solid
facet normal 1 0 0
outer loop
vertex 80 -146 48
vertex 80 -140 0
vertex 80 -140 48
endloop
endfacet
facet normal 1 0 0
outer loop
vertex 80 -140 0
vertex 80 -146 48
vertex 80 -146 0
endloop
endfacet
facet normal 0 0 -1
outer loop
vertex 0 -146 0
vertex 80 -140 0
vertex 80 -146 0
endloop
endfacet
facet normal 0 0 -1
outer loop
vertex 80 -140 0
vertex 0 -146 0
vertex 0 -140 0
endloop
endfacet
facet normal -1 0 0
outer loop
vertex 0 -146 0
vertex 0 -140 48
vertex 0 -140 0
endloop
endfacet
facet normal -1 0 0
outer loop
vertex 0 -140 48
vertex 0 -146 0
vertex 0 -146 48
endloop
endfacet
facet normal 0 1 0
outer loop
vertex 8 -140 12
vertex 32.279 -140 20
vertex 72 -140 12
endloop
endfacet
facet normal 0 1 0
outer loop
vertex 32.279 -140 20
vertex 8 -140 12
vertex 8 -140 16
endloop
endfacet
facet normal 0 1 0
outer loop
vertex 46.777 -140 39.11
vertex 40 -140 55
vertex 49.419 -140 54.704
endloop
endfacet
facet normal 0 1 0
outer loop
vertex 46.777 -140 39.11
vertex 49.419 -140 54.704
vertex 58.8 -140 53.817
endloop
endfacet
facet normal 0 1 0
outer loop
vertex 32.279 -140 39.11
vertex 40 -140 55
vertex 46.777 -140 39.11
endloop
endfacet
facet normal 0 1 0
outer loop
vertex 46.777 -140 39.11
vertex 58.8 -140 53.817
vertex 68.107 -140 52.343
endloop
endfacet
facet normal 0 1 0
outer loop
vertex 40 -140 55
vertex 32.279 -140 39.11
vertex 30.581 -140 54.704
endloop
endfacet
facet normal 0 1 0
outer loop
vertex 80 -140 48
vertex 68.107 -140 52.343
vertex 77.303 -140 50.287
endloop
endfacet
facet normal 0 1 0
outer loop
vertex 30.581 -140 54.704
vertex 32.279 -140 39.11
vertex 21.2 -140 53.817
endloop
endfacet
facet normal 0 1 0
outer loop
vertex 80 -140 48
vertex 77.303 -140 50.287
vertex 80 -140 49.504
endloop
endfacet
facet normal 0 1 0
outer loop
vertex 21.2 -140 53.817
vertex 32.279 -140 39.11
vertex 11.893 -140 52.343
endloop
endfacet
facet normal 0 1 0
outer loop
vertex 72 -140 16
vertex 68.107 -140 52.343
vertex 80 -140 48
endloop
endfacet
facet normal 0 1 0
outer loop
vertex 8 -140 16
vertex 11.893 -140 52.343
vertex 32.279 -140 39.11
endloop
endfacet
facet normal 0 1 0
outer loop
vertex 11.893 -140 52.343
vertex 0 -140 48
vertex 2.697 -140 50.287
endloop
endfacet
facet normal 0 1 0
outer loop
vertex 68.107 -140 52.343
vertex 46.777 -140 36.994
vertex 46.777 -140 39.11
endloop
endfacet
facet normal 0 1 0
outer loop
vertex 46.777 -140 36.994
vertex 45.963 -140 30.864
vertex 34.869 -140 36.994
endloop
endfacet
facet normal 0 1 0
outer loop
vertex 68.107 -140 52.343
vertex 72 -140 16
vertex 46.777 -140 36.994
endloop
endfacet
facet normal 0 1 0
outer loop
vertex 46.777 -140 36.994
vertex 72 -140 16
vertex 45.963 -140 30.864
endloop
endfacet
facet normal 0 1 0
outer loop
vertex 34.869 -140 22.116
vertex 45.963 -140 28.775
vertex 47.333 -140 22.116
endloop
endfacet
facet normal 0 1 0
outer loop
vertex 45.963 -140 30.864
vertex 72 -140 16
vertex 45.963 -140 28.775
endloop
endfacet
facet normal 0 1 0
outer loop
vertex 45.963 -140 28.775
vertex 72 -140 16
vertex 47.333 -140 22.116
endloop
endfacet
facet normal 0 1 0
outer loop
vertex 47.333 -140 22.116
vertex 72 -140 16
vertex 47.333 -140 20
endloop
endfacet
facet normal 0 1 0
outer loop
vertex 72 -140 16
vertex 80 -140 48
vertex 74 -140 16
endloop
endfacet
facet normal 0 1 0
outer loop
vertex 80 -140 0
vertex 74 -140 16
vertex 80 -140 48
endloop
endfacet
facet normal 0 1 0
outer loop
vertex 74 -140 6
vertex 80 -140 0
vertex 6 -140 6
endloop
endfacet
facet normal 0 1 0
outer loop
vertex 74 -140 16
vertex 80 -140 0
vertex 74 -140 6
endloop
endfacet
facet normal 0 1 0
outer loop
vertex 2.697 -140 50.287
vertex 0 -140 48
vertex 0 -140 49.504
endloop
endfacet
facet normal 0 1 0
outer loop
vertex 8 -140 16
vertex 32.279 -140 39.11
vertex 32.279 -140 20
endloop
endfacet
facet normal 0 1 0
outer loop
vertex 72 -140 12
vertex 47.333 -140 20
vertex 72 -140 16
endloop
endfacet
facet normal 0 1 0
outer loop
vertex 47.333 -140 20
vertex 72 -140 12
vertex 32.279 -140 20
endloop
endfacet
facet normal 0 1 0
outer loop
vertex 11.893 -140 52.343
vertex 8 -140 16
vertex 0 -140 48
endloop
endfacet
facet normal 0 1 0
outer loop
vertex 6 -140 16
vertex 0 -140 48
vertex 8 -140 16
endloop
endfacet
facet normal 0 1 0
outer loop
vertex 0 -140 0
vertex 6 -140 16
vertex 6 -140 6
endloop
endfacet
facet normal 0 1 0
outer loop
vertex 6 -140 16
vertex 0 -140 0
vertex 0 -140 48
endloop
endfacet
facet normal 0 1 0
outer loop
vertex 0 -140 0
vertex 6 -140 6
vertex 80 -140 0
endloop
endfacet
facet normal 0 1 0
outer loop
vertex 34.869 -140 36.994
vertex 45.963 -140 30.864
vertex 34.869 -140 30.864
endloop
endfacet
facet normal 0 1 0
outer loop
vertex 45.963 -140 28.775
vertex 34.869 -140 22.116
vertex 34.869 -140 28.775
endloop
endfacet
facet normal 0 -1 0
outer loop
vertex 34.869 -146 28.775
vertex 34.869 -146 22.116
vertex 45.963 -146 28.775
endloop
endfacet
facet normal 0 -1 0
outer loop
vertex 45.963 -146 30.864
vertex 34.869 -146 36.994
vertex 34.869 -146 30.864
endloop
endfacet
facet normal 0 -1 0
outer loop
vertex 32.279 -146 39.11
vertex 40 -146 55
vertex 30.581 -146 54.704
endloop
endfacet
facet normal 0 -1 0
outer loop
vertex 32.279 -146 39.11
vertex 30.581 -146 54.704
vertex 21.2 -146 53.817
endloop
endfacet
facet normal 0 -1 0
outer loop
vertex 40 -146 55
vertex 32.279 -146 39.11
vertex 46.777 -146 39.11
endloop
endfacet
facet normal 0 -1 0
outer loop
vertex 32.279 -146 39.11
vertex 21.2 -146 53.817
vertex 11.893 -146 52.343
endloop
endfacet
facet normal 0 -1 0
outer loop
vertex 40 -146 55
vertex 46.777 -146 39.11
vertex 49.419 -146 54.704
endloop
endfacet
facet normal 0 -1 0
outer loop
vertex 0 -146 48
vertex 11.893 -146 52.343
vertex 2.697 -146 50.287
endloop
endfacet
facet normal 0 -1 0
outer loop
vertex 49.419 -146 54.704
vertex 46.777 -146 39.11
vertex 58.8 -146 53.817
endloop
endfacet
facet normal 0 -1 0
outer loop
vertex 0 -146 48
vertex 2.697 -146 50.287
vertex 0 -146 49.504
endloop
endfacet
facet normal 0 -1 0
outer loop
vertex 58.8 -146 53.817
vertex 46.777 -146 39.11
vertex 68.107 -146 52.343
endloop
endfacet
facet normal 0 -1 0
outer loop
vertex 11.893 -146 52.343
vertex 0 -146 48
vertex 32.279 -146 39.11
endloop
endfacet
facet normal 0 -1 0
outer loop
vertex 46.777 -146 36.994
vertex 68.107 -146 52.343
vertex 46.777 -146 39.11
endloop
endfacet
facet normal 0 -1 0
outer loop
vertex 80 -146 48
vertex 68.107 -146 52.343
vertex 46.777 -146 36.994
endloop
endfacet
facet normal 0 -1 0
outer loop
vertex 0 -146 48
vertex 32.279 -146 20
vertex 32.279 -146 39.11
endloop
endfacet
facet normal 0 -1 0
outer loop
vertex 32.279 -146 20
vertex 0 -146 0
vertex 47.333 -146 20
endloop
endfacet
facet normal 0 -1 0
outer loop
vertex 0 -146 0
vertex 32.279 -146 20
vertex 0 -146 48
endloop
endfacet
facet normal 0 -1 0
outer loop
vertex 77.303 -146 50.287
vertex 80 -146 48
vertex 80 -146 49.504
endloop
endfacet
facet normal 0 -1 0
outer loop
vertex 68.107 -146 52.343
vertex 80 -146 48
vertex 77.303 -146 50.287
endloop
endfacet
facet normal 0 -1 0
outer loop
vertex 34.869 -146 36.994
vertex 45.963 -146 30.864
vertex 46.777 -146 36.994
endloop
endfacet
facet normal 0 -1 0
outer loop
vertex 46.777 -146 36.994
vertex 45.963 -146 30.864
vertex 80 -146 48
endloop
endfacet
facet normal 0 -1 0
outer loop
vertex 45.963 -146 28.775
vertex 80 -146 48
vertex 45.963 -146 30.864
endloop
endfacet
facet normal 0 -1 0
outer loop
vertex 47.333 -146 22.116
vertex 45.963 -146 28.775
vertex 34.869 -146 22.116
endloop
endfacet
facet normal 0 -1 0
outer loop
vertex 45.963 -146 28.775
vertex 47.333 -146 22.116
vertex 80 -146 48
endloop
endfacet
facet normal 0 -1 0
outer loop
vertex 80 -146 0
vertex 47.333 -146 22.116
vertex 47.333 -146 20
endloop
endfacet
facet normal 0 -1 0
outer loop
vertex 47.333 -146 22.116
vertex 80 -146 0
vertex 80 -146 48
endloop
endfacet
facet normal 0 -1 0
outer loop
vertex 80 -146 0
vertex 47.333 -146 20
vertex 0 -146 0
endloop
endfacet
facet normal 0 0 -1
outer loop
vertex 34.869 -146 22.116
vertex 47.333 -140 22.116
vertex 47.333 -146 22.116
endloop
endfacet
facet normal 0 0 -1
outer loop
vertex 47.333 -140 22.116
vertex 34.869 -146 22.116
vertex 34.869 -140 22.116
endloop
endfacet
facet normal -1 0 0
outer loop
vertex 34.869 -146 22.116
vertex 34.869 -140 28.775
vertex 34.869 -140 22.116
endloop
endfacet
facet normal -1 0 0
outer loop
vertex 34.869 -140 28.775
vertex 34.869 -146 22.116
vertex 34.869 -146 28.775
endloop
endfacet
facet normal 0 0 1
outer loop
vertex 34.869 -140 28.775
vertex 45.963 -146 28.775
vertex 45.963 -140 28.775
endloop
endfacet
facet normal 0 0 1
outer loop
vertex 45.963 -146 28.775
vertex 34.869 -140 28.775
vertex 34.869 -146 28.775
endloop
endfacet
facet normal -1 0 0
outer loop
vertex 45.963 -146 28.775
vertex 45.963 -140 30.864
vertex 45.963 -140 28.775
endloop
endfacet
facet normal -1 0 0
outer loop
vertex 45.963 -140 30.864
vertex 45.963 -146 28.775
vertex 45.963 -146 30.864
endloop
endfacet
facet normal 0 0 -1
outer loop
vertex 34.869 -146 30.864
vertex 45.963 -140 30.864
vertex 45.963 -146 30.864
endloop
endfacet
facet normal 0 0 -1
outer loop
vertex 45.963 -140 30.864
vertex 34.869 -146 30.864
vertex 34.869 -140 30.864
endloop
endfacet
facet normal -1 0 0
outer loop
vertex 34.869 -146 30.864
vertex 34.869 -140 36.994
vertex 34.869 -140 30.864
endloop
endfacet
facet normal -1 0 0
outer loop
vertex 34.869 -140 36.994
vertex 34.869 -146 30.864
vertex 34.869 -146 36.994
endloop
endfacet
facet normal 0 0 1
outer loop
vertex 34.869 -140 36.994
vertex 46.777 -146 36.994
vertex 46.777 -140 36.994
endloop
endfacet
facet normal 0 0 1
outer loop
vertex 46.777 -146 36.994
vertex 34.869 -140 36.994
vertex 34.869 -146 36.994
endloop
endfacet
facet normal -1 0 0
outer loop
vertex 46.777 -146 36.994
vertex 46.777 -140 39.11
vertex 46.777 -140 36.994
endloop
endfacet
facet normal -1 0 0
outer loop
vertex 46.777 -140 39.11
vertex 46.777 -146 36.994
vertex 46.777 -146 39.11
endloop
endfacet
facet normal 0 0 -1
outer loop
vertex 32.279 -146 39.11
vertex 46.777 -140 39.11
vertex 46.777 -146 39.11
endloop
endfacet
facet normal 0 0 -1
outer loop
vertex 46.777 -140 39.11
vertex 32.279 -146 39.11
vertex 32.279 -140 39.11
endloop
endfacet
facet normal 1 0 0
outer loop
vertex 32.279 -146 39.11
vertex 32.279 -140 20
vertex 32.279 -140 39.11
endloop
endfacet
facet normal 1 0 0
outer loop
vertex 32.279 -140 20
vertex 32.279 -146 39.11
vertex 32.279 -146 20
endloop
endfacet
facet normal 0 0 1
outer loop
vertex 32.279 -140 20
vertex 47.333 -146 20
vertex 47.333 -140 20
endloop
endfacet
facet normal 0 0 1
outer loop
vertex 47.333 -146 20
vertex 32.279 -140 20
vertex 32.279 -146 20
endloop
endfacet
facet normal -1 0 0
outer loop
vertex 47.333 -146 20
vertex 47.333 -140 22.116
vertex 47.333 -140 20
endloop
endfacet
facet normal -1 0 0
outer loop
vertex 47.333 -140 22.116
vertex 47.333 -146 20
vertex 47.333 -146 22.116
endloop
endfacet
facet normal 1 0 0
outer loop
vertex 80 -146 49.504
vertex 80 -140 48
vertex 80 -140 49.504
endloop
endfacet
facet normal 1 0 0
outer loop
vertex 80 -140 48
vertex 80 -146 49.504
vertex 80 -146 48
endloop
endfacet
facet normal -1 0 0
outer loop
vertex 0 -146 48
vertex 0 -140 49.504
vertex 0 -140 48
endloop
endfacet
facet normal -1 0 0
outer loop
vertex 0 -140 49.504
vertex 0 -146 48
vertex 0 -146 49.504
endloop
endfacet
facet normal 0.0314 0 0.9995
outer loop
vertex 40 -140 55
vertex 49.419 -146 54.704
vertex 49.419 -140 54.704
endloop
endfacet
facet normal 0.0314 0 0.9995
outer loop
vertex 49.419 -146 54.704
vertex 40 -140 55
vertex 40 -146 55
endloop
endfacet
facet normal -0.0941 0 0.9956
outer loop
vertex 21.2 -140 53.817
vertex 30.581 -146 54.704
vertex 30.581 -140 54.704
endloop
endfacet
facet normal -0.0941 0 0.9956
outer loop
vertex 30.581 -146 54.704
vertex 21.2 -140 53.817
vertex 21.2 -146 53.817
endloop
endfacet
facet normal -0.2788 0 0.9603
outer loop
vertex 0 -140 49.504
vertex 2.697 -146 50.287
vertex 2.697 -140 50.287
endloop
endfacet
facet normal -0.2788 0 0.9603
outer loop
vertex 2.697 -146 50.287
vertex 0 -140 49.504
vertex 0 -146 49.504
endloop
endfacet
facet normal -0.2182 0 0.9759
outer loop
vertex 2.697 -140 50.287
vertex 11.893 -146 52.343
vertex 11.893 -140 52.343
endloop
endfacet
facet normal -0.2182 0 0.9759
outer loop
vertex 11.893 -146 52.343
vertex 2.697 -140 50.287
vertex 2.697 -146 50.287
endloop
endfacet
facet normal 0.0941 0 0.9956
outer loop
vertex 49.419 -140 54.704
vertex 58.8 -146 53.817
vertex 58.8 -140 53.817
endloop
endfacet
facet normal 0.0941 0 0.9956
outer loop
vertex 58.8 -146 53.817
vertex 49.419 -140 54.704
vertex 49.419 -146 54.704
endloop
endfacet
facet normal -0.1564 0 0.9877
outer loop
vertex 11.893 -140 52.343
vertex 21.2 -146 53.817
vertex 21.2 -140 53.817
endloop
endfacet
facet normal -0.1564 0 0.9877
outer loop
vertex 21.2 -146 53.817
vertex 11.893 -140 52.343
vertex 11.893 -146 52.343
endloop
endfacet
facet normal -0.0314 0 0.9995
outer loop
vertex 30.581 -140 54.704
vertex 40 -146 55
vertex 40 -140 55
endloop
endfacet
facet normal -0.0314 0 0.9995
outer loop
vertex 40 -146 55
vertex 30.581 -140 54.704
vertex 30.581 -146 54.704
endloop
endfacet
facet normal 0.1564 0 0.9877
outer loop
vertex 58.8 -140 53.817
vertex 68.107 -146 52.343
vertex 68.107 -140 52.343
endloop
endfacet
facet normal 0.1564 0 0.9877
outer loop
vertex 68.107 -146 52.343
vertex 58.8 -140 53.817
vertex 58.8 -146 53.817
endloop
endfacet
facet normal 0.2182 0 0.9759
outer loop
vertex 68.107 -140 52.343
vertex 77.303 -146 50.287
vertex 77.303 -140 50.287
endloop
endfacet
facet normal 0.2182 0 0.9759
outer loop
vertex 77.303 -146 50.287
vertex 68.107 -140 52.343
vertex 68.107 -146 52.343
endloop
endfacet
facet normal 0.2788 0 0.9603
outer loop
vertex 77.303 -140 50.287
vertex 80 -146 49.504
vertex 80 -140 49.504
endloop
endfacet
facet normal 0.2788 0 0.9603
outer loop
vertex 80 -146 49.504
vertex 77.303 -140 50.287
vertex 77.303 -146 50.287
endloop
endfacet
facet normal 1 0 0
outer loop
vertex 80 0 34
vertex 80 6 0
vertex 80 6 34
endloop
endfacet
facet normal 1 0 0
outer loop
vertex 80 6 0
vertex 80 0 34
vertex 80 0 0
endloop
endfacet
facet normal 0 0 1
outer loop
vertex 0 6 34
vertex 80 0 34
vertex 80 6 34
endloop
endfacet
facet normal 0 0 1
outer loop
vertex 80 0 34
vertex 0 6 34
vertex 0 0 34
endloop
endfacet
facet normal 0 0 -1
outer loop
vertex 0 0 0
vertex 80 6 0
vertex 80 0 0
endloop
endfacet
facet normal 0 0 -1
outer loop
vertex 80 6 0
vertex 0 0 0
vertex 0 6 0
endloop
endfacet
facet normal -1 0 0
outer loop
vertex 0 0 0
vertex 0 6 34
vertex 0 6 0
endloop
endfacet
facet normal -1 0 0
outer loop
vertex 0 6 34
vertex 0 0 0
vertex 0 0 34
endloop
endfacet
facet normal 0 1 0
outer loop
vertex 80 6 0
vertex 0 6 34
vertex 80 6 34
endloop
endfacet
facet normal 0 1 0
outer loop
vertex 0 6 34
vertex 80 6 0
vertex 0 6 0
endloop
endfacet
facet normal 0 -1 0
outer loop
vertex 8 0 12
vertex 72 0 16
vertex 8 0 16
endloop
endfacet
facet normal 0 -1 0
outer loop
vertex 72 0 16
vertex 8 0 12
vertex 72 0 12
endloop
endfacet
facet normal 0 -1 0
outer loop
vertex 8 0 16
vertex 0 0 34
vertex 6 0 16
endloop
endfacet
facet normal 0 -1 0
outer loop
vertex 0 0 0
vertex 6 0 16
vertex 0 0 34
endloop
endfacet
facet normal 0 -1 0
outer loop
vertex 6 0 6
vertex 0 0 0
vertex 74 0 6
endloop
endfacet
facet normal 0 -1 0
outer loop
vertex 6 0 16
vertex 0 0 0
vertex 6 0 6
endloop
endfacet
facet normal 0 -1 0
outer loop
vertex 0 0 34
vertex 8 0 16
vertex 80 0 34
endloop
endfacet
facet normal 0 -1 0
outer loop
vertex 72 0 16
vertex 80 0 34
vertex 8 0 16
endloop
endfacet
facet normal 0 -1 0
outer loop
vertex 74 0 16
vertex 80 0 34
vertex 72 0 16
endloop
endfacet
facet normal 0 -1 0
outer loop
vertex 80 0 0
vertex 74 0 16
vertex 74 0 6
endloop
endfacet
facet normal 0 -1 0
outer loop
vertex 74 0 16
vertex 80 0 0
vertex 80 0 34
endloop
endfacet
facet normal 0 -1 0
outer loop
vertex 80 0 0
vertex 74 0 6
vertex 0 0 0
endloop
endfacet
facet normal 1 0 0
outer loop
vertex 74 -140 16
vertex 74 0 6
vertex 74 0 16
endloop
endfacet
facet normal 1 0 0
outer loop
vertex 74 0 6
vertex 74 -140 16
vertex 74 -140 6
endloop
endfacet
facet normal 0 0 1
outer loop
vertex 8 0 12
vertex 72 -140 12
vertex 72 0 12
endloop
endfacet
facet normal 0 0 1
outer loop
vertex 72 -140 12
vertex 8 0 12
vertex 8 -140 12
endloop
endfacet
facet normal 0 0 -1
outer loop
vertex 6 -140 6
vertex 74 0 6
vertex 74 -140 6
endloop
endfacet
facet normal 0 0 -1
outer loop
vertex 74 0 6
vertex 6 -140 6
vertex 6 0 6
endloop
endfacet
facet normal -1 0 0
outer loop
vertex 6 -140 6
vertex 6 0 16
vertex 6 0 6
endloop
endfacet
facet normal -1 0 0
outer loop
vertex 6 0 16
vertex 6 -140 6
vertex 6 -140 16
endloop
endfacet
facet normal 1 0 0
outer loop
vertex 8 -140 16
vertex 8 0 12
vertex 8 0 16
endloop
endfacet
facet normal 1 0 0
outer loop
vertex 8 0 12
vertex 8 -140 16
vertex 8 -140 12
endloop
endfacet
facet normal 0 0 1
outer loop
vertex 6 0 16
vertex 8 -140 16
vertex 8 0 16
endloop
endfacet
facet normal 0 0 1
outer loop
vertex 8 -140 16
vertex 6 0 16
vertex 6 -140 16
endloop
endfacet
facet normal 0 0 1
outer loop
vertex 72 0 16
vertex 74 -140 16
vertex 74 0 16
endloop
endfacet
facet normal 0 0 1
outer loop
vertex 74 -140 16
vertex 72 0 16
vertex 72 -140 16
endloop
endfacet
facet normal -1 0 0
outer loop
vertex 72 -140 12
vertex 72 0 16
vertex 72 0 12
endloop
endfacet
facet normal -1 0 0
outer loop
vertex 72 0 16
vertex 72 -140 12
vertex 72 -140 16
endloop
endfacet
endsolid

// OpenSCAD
// Doll's Bed
// Copyright 2018 Harald Mühlhoff, 58300 Wetter, Germany

// Thickness
a=6; 
// Width
b=80; 
// Length
c=140; 
// Letter
l="E"; 

cube([b,a,34]);

translate([(b-68)/2,-c,a])
cube([68,c,a]);

difference() {
    translate([0, -c-a, 0])
    cube([b,a,48]);
        
    translate([b/2-10, -c+2 , 20])
    rotate([90,0,0])
    linear_extrude(height=8)
    text(l, size=20);
}


difference() {
    translate([b/2,-c, -95])
    rotate([90,0,0])
    cylinder(a,d=300,$fn=100);

    union() {
        translate([-200, -150, -300])
        cube([400,300,300]);

        translate([b, -c-a, -50])
        cube([100, 100, 100]);    
            
        translate([-100, -c-a, -50])
        cube([100, 100, 100]);    
            
        translate([0, -c-a, 0])
        cube([b,8,48]);
    }
}

translate([(b-68)/2, -c, 12])
cube([2, c, 4]);

translate([(b-68)/2 + 68 -2, -c, 12])
cube([2, c, 4]);
